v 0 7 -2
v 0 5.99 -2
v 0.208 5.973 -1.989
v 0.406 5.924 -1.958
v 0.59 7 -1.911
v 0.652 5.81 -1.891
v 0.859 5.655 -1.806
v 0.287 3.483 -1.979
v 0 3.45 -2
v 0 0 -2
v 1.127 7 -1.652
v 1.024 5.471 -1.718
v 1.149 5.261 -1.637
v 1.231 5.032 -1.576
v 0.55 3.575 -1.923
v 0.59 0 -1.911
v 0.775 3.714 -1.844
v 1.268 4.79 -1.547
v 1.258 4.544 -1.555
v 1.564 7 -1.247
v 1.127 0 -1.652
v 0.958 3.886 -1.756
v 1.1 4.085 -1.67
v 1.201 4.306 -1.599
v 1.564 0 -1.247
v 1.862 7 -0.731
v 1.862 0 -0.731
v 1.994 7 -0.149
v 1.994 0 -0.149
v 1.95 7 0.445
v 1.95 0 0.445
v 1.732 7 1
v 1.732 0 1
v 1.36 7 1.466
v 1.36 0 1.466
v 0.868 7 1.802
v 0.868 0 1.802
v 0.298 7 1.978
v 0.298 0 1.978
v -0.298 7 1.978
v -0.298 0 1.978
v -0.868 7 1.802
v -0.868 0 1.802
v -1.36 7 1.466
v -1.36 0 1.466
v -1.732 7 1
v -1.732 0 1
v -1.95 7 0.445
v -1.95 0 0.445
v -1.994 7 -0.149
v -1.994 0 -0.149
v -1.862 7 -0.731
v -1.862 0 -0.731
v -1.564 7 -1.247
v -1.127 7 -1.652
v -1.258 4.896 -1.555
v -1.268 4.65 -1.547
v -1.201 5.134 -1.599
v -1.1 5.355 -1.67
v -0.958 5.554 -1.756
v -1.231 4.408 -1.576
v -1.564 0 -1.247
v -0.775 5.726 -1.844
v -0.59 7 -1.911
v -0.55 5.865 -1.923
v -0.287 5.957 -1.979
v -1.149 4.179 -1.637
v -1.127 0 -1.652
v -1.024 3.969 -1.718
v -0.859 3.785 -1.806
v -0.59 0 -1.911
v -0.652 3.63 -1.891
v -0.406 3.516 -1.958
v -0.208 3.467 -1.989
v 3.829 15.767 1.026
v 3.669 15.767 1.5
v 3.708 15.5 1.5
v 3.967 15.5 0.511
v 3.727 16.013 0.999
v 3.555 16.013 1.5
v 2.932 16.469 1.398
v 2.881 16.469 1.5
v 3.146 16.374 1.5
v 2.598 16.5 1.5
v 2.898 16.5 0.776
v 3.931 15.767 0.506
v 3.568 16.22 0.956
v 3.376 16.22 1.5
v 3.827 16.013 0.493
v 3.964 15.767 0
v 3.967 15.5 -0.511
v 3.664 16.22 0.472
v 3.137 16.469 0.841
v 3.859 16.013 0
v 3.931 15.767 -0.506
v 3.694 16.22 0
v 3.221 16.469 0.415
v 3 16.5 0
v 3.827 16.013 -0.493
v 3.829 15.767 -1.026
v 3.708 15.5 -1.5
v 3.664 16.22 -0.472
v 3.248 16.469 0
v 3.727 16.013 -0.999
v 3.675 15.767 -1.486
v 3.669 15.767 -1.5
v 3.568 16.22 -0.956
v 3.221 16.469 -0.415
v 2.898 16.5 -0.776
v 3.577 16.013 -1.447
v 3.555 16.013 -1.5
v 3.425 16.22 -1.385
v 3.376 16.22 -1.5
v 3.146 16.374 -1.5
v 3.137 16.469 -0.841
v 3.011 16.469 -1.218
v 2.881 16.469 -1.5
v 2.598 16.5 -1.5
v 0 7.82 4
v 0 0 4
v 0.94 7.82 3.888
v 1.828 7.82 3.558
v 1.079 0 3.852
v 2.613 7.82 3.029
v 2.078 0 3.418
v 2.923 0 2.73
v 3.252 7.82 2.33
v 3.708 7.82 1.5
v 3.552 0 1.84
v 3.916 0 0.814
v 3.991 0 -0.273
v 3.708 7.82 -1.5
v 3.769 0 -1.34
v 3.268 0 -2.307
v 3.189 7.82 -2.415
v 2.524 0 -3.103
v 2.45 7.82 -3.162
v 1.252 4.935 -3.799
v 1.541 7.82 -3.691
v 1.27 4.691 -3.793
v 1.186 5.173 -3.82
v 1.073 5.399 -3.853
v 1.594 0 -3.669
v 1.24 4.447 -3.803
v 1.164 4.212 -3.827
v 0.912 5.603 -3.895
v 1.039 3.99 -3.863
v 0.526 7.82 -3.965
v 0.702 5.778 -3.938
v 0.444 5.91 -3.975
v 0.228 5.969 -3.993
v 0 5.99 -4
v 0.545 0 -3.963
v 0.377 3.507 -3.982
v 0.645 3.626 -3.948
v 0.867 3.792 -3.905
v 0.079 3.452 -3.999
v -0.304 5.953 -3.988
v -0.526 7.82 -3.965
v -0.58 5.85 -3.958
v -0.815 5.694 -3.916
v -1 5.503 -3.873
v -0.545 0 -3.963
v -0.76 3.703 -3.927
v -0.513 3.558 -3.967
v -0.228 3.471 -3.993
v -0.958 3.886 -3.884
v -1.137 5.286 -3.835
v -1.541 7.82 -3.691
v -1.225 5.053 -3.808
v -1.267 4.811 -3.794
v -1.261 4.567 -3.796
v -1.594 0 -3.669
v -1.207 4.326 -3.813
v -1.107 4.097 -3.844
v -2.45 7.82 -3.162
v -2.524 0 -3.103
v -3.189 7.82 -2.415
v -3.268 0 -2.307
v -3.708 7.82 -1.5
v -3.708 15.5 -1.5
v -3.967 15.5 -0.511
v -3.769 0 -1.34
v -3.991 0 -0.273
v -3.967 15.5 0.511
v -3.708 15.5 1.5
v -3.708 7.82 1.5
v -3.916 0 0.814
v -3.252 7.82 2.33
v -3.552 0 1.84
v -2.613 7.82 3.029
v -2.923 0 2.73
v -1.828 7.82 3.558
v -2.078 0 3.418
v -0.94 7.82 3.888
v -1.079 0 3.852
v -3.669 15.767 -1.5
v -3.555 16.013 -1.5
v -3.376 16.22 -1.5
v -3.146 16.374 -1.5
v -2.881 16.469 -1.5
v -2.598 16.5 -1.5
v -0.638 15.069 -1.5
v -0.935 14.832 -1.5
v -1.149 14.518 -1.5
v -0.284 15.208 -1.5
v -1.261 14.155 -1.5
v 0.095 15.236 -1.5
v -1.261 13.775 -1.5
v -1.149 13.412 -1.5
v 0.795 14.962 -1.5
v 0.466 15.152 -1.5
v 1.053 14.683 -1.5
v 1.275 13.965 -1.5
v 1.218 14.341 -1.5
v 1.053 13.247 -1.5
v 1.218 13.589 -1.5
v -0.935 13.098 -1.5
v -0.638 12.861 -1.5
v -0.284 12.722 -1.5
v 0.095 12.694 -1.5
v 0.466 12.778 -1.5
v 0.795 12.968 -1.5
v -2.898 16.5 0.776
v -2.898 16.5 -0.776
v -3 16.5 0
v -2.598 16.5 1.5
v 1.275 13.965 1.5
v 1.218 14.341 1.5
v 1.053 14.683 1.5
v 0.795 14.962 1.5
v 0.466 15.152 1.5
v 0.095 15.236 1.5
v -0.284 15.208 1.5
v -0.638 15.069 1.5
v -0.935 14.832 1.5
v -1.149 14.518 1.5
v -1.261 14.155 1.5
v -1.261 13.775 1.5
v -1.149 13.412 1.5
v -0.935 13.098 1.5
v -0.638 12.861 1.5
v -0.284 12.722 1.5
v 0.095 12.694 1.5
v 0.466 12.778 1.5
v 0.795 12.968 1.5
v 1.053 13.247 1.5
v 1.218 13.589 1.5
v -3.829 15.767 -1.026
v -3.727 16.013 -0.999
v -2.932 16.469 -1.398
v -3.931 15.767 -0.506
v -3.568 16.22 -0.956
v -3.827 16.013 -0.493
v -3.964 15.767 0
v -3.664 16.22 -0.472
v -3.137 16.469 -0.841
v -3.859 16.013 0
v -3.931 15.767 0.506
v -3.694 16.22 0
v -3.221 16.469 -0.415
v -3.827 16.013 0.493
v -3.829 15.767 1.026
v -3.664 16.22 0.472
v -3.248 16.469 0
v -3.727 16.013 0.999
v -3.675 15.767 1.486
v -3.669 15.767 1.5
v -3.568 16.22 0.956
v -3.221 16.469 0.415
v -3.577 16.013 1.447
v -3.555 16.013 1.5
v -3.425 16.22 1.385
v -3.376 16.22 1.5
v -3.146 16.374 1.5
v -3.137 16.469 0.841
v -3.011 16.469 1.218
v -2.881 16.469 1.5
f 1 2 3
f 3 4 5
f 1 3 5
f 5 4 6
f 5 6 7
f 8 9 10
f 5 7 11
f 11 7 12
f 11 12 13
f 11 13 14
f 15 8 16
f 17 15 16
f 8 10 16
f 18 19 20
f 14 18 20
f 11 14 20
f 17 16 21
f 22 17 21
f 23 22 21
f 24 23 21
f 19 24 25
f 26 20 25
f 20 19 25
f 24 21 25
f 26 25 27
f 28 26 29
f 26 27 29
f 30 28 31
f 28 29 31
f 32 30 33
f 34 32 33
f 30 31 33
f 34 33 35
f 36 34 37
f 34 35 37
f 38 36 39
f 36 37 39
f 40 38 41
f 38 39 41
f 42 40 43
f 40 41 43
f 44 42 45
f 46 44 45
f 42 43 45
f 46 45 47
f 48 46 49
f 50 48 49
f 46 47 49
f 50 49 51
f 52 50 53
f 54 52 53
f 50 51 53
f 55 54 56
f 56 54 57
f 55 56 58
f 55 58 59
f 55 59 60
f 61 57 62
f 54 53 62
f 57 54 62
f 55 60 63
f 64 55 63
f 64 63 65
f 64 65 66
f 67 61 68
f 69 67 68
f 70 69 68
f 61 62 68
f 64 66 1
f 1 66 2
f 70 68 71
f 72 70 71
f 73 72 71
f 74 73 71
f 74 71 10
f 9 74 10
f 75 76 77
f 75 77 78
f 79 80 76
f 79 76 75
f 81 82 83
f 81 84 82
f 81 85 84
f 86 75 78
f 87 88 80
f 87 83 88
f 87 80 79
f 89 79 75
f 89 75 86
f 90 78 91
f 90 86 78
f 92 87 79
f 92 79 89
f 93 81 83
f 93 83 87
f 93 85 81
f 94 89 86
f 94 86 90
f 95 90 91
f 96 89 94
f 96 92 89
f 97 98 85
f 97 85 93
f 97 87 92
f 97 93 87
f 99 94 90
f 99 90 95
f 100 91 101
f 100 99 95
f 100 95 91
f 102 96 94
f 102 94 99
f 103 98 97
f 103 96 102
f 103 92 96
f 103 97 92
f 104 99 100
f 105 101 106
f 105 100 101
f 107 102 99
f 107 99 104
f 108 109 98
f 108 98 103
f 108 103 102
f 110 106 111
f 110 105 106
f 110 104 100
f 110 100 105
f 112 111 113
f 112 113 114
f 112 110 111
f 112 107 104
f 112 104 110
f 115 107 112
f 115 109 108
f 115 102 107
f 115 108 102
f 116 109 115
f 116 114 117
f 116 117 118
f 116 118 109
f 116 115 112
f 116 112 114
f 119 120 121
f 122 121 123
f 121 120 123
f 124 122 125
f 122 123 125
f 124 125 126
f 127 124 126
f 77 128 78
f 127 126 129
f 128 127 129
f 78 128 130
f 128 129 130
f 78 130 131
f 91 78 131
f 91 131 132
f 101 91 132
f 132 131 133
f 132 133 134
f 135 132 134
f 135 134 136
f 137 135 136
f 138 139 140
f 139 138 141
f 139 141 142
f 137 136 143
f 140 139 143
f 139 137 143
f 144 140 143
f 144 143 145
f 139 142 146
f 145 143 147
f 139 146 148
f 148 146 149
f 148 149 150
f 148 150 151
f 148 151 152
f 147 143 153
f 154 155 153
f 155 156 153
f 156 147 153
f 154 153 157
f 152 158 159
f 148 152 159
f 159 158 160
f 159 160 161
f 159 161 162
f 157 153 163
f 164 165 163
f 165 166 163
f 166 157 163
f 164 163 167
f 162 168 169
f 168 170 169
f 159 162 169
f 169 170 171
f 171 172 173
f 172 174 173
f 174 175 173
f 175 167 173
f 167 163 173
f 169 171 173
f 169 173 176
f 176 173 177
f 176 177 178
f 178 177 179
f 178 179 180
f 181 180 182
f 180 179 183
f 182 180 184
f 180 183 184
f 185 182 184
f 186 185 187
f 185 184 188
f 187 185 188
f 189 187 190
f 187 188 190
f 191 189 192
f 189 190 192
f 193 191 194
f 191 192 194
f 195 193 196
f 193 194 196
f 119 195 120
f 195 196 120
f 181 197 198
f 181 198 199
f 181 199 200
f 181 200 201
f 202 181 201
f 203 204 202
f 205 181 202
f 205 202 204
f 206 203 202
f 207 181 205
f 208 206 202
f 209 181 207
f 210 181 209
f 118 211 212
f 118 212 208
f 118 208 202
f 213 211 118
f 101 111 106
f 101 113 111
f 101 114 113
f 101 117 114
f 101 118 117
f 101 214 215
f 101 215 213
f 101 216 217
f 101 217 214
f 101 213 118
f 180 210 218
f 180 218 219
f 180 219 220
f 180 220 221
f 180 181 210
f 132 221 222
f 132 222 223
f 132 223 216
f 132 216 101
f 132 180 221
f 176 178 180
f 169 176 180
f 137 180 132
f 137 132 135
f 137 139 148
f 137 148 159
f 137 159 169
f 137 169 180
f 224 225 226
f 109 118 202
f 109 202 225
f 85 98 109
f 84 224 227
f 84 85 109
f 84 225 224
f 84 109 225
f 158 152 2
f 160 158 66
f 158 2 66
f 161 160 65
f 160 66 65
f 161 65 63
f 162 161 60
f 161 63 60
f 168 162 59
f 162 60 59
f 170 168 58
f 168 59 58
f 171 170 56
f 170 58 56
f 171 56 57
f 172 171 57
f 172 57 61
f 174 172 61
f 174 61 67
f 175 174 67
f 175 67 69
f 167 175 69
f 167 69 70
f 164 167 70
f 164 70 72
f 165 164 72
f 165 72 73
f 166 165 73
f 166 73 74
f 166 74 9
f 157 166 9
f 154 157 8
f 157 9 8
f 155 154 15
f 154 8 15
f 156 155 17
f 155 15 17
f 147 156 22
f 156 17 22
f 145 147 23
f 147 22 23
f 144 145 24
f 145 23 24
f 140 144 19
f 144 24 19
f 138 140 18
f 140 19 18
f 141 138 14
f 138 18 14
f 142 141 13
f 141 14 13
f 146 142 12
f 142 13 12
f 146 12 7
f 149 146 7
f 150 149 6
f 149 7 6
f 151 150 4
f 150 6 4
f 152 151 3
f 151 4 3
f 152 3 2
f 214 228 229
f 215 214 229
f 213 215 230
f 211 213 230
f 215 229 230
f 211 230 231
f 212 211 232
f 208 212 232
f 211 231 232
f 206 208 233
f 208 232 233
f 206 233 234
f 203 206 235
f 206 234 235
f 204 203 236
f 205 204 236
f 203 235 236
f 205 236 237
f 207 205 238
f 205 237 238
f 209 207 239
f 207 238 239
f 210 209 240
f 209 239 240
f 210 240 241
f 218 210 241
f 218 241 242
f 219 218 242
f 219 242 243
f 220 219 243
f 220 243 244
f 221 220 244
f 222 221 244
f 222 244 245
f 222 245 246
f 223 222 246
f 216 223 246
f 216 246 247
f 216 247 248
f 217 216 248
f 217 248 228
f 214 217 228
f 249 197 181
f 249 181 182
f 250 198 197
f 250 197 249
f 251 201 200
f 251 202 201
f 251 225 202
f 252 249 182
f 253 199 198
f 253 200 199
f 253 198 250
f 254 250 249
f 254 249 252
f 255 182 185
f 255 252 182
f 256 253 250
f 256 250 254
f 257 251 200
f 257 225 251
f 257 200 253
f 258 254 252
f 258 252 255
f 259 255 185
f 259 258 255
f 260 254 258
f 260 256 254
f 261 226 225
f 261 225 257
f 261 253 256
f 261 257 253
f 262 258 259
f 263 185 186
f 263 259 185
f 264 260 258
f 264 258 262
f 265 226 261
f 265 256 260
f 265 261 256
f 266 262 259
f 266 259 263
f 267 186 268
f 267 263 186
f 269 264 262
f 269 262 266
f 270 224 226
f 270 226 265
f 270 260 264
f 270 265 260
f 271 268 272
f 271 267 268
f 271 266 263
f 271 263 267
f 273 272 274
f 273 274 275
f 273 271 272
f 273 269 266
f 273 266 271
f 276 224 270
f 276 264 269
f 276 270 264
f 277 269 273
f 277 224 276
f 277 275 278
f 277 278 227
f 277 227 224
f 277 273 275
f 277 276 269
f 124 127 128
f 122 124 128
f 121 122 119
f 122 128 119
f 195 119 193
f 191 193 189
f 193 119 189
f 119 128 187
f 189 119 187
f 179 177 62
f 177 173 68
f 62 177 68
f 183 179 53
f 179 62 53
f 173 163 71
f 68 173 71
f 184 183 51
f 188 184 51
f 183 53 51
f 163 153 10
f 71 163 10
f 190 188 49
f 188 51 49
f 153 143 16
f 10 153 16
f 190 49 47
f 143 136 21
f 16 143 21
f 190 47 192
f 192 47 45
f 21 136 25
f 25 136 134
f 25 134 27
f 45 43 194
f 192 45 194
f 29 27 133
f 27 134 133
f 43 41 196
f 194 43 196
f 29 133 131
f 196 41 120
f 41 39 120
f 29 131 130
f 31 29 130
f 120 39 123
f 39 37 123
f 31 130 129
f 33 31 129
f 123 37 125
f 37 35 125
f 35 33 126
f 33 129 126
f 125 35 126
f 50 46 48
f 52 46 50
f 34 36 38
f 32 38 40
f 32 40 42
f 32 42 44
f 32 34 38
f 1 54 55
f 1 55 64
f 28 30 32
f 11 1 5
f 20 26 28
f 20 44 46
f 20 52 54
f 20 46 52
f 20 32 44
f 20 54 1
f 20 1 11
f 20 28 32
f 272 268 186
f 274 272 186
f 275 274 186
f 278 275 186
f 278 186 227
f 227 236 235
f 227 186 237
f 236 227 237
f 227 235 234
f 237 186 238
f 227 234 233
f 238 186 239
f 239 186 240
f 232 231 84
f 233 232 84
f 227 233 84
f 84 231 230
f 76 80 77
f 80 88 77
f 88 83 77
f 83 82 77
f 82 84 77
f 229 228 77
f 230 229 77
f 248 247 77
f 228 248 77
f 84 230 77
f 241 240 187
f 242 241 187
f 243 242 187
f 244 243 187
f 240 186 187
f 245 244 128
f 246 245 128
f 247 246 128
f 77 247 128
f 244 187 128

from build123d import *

# Parameters (mm, degrees)
SKETCH1_R           = 4
BOSS_EXTRUDE1_DEPTH = 16.5
CUT_EXTRUDE1_START  = -8.68
CUT_EXTRUDE1_DEPTH  = 8.68
SKETCH5_R           = 2
CUT_EXTRUDE3_DEPTH  = 7
SKETCH4_R           = 1.275
SKETCH4_R_2         = 1.27
CUT_EXTRUDE2_DEPTH  = 18.846568298
FILLET1_R           = 1


with BuildPart() as part:
    # Sketch1 → Boss-Extrude1 (new body)
    with BuildSketch(Plane(origin=(0, 0, 0), x_dir=(1, 0, 0), z_dir=(0, 1, 0))):
        with Locations(Location((0, 0, 0), (0, 0, 270))):
            Circle(SKETCH1_R)
    extrude(amount=BOSS_EXTRUDE1_DEPTH)

    # Sketch2 → Cut-Extrude1 (cut)
    with BuildSketch(Plane(origin=(0, 16.5, 0), x_dir=(1, 0, 0), z_dir=(0, 1, 0)).offset(CUT_EXTRUDE1_START)):
        with BuildLine():
            Line((-3.708099244, 1.5), (3.708099244, 1.5))
            ThreePointArc((3.708099244, 1.5), (0, 4), (-3.708099244, 1.5))
        make_face()
        with BuildLine():
            Line((-3.708099244, -1.5), (3.708099244, -1.5))
            ThreePointArc((3.708099244, -1.5), (0, -4), (-3.708099244, -1.5))
        make_face()
    extrude(amount=CUT_EXTRUDE1_DEPTH, mode=Mode.SUBTRACT)

    # Sketch5 → Cut-Extrude3 (cut)
    with BuildSketch(Plane.XZ):
        with Locations(Location((0, 0, 0), (0, 0, 270))):
            Circle(SKETCH5_R)
    extrude(amount=-CUT_EXTRUDE3_DEPTH, mode=Mode.SUBTRACT)

    # Sketch4 → Cut-Extrude2 (cut, through all)
    with BuildSketch(Plane.XY.offset(1.5)):
        with Locations((0, 13.965)):
            Circle(SKETCH4_R)
        with Locations(Location((0, 4.72, 0), (0, 0, 90))):
            Circle(SKETCH4_R_2)
    extrude(amount=-CUT_EXTRUDE2_DEPTH, mode=Mode.SUBTRACT)

    # Fillet1
    fillet1_edges = [part.edges().sort_by_distance(p)[0] for p in [
        (4, 16.5, 0),
        (-4, 16.5, 0),
    ]]
    fillet(fillet1_edges, radius=FILLET1_R)


solid = part.part
